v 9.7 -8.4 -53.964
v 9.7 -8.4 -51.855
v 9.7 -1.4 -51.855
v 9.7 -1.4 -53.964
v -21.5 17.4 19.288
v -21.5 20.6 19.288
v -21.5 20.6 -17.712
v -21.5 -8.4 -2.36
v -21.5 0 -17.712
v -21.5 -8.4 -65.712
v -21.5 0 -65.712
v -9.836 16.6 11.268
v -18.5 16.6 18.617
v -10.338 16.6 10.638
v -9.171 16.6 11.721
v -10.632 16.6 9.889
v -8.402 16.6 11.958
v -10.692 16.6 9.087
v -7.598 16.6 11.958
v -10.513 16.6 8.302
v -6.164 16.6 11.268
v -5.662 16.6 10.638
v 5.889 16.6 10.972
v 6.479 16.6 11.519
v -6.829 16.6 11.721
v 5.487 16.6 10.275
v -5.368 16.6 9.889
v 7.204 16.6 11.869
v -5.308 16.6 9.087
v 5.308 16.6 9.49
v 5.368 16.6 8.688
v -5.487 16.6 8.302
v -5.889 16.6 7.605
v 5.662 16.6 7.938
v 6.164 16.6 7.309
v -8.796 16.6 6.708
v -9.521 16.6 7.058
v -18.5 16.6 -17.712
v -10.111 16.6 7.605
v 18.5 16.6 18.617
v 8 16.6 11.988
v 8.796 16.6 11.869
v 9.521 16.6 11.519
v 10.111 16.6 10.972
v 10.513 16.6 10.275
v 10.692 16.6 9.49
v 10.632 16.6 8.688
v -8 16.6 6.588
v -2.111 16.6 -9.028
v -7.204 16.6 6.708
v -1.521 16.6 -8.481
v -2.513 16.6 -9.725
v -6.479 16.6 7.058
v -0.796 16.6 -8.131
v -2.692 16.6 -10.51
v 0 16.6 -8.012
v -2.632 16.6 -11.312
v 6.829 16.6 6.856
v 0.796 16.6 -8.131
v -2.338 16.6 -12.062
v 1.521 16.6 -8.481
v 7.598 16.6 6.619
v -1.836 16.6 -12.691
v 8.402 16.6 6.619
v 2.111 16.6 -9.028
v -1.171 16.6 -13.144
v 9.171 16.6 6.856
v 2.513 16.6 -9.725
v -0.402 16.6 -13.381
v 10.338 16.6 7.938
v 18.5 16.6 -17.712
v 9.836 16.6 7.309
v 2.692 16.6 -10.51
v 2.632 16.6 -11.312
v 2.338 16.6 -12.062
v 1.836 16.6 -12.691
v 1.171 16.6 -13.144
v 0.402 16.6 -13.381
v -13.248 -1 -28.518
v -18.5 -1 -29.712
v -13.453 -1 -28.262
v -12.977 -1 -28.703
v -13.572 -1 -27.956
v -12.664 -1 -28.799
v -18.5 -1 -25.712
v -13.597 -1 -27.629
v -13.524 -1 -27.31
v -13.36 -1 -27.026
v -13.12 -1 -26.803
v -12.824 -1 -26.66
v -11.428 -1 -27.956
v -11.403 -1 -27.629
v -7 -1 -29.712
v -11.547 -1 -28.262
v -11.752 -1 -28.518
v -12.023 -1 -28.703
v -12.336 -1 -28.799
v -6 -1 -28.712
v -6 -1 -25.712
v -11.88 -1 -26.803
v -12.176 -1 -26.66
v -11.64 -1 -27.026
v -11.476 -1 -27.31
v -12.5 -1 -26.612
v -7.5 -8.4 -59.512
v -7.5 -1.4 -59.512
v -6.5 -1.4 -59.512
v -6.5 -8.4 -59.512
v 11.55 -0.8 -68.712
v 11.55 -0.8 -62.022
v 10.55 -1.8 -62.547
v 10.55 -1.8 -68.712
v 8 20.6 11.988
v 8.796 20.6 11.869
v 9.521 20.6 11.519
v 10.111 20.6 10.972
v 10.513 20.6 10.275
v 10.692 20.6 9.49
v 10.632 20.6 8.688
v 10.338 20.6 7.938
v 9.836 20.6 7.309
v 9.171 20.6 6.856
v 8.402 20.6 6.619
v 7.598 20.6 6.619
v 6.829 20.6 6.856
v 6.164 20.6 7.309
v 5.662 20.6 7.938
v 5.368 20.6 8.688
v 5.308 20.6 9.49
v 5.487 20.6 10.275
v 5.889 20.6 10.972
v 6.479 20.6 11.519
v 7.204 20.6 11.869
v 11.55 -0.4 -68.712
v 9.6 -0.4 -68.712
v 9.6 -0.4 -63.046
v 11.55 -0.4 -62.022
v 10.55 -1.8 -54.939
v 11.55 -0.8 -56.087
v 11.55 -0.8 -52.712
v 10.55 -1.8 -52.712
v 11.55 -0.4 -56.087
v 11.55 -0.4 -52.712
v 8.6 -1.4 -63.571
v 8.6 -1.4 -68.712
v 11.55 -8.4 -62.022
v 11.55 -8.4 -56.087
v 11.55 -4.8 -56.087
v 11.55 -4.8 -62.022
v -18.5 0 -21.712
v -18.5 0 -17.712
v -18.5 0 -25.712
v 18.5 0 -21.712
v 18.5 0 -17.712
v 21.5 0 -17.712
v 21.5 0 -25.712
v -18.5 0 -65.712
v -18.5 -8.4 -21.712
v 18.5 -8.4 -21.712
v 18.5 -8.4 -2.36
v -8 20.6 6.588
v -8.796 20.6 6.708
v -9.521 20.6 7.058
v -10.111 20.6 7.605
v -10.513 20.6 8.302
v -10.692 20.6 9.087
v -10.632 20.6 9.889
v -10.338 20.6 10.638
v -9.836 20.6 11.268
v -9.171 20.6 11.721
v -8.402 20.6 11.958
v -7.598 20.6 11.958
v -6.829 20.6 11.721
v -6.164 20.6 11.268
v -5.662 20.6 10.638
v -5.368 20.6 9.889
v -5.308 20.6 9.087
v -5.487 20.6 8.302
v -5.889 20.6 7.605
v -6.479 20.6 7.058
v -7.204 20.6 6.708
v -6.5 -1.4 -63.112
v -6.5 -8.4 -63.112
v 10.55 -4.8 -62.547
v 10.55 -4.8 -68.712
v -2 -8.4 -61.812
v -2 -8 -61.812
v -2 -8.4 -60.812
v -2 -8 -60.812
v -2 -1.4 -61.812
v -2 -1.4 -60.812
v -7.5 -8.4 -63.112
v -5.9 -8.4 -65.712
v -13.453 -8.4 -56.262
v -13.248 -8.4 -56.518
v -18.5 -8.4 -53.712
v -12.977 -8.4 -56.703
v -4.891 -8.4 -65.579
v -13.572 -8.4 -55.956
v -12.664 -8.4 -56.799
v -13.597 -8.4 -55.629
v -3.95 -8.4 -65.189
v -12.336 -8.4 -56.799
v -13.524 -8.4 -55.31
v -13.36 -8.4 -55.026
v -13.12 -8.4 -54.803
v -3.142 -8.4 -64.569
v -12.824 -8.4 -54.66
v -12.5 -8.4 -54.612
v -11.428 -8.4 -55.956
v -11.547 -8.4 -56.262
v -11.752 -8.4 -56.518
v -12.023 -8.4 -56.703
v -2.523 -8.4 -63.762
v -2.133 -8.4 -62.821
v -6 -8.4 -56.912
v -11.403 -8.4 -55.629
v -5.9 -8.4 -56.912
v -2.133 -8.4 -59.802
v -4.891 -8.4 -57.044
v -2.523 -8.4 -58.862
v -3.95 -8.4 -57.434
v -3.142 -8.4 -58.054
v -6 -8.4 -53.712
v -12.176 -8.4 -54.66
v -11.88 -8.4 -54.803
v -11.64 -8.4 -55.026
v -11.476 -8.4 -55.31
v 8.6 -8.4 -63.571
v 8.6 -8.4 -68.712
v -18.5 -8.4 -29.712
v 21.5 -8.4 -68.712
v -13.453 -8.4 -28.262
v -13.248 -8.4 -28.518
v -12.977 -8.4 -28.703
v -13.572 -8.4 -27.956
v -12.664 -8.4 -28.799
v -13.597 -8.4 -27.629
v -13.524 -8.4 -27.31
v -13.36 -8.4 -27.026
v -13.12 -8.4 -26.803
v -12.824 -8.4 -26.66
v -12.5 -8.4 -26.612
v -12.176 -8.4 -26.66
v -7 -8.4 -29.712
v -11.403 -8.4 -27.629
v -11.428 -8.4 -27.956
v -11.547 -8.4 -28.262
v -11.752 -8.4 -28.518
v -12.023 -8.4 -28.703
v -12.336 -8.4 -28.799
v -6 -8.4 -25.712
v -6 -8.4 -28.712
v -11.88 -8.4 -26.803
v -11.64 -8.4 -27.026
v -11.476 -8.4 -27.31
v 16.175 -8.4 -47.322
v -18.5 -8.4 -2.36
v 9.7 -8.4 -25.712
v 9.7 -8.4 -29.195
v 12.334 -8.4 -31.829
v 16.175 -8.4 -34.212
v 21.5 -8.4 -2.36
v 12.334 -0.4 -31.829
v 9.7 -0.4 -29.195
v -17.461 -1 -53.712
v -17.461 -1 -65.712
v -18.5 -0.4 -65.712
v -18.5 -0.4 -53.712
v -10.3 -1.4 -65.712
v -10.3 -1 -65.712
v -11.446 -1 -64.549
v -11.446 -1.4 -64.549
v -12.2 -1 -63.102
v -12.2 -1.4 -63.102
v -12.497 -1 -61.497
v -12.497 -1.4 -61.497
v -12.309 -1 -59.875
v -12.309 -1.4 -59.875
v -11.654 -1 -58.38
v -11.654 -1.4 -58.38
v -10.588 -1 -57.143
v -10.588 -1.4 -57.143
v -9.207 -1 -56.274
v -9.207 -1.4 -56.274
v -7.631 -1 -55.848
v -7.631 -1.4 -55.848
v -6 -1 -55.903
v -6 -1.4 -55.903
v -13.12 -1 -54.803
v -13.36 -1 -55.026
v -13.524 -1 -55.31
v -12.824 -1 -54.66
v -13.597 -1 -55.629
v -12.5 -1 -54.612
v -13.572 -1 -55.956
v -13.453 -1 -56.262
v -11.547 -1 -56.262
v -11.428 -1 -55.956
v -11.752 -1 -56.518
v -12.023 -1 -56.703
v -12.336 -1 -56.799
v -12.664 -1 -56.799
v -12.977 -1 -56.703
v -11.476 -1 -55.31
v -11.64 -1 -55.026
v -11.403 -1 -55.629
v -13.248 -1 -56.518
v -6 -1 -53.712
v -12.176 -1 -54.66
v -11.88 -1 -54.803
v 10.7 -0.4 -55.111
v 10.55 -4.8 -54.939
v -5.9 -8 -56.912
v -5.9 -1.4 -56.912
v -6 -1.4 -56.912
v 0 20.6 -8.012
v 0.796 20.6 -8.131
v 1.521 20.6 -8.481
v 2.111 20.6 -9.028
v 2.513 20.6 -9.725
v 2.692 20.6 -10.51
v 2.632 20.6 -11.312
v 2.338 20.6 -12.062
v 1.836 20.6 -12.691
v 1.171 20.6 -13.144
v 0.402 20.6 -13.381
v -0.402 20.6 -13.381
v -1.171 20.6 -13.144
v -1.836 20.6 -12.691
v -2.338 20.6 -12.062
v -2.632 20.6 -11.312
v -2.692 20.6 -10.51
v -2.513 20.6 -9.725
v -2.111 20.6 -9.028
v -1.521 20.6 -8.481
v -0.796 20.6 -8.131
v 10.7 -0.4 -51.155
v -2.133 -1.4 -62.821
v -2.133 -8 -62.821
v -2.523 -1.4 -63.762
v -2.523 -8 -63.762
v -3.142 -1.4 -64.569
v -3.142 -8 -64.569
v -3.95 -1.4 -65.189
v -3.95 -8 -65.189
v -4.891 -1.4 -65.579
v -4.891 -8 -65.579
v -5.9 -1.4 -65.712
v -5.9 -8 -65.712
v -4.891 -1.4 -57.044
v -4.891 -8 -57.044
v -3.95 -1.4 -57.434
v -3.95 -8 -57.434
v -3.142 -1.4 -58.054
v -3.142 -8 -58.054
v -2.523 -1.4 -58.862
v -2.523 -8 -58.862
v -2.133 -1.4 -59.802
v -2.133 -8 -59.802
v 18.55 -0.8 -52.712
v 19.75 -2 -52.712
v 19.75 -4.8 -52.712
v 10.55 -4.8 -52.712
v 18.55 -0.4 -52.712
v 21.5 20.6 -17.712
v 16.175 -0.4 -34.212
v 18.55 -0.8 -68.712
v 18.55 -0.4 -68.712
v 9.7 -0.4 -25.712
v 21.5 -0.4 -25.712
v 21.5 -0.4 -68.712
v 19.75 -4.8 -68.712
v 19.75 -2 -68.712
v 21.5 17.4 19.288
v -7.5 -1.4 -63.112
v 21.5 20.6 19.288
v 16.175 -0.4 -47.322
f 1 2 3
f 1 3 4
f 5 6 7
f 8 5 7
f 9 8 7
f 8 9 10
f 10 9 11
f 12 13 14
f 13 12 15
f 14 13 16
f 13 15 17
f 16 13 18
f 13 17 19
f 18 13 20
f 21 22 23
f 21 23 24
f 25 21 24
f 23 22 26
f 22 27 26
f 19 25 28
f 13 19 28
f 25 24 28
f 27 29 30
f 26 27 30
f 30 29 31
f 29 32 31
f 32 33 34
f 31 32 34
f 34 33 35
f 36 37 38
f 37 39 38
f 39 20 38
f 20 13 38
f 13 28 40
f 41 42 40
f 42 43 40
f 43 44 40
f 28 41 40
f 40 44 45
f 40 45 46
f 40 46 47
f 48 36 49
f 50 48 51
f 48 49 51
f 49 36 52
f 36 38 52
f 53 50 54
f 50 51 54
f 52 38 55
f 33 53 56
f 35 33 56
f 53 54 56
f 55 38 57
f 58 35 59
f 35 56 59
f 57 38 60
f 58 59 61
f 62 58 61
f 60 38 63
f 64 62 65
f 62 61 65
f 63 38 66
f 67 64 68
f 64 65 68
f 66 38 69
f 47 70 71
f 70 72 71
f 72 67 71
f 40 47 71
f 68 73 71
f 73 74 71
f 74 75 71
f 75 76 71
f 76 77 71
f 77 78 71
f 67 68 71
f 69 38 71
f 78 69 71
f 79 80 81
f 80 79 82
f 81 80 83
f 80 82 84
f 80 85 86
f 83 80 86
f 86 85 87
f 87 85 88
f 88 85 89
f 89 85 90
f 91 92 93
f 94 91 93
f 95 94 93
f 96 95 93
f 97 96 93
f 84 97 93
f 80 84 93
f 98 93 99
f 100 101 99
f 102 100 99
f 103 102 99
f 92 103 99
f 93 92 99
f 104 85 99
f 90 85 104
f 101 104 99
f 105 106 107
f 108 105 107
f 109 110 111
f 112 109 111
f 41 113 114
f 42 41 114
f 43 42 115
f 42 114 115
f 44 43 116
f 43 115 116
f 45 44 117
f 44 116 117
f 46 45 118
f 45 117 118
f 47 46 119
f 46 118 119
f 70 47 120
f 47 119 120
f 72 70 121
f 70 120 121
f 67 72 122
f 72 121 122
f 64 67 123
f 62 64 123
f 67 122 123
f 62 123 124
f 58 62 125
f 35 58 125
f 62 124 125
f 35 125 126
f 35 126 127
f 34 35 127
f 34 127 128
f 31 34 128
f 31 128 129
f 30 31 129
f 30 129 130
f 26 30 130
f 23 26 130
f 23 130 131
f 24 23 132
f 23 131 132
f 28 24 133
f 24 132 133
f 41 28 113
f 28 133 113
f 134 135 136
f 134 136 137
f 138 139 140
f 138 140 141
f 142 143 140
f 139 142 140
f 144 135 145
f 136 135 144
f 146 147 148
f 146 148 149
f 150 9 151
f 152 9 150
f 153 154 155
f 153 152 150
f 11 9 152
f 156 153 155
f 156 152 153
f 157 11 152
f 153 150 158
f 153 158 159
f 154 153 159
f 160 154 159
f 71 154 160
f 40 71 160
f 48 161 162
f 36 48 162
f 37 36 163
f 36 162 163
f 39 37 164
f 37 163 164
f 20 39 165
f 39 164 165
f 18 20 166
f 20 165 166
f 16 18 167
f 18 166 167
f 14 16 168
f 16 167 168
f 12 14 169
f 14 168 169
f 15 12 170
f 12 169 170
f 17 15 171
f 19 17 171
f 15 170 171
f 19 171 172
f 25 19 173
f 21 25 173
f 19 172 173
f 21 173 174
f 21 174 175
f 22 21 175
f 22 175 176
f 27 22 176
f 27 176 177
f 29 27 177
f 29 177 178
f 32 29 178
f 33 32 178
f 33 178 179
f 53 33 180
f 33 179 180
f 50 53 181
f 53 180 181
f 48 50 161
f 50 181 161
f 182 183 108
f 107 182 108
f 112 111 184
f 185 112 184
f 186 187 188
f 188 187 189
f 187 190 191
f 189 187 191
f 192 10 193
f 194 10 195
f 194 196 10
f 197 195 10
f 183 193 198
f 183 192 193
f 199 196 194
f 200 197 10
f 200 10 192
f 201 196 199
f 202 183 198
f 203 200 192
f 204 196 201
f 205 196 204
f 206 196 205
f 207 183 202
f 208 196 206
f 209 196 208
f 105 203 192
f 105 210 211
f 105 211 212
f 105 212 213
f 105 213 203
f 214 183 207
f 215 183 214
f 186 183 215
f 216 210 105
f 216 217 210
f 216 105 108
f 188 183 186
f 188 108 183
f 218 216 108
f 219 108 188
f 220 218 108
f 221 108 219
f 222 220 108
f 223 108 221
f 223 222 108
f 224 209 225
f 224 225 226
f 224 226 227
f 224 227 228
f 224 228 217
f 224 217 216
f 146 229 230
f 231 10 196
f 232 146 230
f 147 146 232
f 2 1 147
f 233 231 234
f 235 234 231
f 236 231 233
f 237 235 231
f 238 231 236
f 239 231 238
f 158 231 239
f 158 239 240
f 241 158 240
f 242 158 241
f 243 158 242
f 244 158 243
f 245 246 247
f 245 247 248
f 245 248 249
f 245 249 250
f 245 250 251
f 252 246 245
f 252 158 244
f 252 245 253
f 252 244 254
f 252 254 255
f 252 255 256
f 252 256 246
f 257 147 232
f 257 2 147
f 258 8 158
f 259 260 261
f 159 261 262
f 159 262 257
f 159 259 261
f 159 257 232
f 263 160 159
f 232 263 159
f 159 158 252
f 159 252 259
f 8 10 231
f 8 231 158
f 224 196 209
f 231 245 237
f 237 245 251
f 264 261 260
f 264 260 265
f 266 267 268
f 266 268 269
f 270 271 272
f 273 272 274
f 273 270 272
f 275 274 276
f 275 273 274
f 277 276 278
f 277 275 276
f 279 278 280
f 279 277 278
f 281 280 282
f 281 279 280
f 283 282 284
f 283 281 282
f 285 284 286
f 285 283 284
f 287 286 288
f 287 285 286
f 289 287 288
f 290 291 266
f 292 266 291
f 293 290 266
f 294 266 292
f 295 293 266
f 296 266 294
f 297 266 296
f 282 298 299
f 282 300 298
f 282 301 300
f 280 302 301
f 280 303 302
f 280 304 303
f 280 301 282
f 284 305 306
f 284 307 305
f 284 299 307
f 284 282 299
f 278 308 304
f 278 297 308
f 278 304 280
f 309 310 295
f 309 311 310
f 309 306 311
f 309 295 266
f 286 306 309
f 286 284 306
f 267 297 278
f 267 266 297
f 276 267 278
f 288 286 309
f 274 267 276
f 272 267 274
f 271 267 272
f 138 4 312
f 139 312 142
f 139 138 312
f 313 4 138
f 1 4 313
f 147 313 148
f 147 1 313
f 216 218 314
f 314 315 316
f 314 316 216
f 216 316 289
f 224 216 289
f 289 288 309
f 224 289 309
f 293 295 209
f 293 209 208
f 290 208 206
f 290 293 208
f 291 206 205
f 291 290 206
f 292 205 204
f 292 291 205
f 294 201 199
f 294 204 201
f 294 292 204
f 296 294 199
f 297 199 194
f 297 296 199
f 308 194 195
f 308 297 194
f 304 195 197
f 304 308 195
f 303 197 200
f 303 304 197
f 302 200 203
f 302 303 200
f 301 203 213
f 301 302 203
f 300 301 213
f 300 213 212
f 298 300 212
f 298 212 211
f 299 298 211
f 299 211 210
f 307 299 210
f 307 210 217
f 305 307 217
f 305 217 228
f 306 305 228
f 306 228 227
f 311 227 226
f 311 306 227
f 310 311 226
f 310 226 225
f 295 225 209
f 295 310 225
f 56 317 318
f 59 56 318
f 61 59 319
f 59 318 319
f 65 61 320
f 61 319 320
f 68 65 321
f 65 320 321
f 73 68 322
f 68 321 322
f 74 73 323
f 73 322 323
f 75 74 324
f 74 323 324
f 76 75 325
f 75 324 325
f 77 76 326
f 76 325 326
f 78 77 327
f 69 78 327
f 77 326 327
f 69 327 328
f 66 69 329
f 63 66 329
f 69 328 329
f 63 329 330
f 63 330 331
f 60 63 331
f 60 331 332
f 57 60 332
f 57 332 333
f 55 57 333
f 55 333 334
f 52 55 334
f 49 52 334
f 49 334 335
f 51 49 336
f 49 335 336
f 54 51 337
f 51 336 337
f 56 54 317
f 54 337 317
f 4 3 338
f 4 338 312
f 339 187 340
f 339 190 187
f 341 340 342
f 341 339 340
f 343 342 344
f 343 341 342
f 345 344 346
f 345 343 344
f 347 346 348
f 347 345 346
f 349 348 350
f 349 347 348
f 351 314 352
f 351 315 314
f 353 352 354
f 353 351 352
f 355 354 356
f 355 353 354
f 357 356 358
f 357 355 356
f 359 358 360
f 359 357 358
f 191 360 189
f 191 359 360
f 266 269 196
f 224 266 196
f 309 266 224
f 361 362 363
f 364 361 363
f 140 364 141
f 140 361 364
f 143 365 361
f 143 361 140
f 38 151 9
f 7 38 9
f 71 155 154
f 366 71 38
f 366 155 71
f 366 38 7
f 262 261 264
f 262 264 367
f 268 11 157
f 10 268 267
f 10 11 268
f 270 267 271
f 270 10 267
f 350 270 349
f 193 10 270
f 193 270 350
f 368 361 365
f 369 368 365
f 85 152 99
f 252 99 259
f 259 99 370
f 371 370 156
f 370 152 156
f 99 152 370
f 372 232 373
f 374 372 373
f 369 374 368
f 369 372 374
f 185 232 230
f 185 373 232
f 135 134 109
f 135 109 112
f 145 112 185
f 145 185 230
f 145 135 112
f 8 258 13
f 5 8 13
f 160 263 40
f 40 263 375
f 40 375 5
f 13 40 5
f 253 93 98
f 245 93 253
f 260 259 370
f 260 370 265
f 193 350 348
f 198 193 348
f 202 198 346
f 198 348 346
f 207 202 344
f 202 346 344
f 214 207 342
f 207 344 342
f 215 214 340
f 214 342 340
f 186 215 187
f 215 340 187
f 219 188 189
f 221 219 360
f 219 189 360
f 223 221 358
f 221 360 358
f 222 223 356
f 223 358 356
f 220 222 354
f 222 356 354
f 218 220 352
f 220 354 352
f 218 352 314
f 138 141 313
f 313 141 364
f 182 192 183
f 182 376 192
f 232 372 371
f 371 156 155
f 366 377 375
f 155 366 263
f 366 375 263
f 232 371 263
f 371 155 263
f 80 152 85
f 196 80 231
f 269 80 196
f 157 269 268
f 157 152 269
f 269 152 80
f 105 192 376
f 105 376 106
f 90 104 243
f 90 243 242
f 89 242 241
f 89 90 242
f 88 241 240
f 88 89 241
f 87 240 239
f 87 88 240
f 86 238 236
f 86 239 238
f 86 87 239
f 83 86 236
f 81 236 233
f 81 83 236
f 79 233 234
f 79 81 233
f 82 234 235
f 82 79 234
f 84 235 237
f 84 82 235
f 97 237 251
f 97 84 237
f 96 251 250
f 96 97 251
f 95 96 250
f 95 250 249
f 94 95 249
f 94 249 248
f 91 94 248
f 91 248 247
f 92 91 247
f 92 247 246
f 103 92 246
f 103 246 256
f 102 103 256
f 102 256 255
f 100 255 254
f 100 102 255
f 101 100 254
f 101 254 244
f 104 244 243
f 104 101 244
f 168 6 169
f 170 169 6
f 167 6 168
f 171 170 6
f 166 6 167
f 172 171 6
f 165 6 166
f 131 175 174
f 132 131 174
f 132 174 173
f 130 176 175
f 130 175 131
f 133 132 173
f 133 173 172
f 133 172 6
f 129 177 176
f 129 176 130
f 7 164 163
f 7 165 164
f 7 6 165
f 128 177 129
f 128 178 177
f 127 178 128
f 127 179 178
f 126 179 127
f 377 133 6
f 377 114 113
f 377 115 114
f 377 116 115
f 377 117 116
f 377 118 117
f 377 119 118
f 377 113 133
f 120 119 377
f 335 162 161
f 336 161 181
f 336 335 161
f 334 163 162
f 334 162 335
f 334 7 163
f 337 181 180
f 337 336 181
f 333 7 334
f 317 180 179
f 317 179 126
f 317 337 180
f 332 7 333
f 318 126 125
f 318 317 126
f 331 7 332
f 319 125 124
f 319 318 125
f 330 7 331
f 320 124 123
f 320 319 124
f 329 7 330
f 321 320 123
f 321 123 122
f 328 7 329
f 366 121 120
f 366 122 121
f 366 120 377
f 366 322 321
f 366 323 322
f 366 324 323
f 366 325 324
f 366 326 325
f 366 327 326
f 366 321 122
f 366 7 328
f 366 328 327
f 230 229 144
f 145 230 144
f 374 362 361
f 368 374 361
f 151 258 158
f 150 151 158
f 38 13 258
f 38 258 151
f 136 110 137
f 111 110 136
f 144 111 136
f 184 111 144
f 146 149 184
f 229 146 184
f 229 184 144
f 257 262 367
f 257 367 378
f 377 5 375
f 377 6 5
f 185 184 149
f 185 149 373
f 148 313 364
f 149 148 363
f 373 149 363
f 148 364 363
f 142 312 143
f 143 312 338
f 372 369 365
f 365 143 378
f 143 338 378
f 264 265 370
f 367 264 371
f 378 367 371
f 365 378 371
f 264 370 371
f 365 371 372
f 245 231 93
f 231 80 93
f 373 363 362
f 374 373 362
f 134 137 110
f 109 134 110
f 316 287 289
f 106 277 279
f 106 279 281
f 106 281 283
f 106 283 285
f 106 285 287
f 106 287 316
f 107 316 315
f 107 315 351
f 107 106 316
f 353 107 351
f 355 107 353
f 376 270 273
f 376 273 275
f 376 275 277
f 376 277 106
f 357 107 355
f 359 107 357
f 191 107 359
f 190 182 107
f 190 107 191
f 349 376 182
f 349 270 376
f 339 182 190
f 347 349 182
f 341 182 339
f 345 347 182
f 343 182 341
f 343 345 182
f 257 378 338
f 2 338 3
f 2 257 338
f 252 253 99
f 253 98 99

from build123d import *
from OCP.BRepFilletAPI import BRepFilletAPI_MakeChamfer

# Parameters (mm, degrees)
SKETCH1_W                       = 3
SKETCH1_H                       = 37
SKETCH1_H_2                     = 48
BOSS_EXTRUDE1_DEPTH             = 8
SKETCH4_W                       = 19.5
SKETCH4_H                       = 8.8
BOSS_EXTRUDE3_DEPTH             = 6.6
SERVO_HOLDER_DEPTH              = 0.4
SERVO_HOLDER_DEPTH_BACK         = 7
SKETCH3_W                       = 15.5
SKETCH3_H                       = 4
SKETCH3_R                       = 1.04
SKETCH5_W                       = 1
SKETCH5_H                       = 3.6
CUT_EXTRUDE2_DEPTH              = 70.647801738
SKETCH11_W                      = 43
SKETCH11_H                      = 4
BOSS_EXTRUDE9_DEPTH             = 8
BOSS_EXTRUDE9_DIRECTION_2_REACH = 71.601
SKETCH14_W                      = 12.223643904
SKETCH14_H                      = 44.979564252
CUT_EXTRUDE5_DEPTH              = 10
FILLET2_R                       = 3.9
CUT_EXTRUDE4_DEPTH              = 70.647801738
CUT_EXTRUDE4_DEPTH_BACK         = 70.647801738
SKETCH13_R                      = 1.1
SKETCH17_W                      = 12.9
SKETCH17_H                      = 8
BOSS_EXTRUDE11_DEPTH            = 27
BOSS_EXTRUDE12_DEPTH            = 16
SKETCH18_W                      = 1
SKETCH18_H                      = 3.6
SKETCH18_W_2                    = 3
SKETCH18_H_2                    = 24
SKETCH18_H_3                    = 41
BOSS_EXTRUDE13_DEPTH            = 0.4
CHAMFER14_SIZE                  = 1.2
CUT_EXTRUDE6_DEPTH              = 73.439806169
CUT_EXTRUDE6_DEPTH_BACK         = 73.439806169
SKETCH22_W                      = 43
SKETCH22_H                      = 37
SKETCH22_R                      = 2.7
MOUNT_TOP_DEPTH                 = 4
SKETCH23_W                      = 37
SKETCH23_H                      = 29
MOUNT_SIDE1_DEPTH               = 3
SKETCH24_W                      = 37
SKETCH24_H                      = 29
MOUNT_SIDE2_DEPTH               = 3
CHAMFER20_SIZE                  = 21.648770484
CHAMFER20_SIZE_2                = 25.8
SKETCH29_W                      = 8.885937164
SKETCH29_H                      = 8
BOSS_EXTRUDE20_DEPTH            = 0.4
CHAMFER23_SIZE                  = 1
CHAMFER24_SIZE                  = 1
CHAMFER24_SIZE2                 = 3.099667104
SKETCH26_R                      = 5.5
CUT_EXTRUDE8_DEPTH              = 10
CHAMFER25_SIZE                  = 0.6
CHAMFER25_SIZE2                 = 1.039230485


with BuildPart() as part:
    # Sketch1 → Boss-Extrude1 (new body)
    with BuildSketch(Plane(origin=(0, 0, 0), x_dir=(1, 0, 0), z_dir=(0, 1, 0))):
        with Locations((-20, -0.788461538)):
            Rectangle(SKETCH1_W, SKETCH1_H)
        with Locations((-20, 41.711538462)):
            Rectangle(SKETCH1_W, SKETCH1_H_2)
        with Locations((20, -0.788461538)):
            Rectangle(SKETCH1_W, SKETCH1_H)
        with Locations((20, 41.711538462)):
            Rectangle(SKETCH1_W, SKETCH1_H_2)
    extrude(amount=-BOSS_EXTRUDE1_DEPTH)

    # Sketch4 → Boss-Extrude3 (add)
    with BuildSketch(Plane.XZ.offset(8)):
        with Locations((-11.75, -61.311538462)):
            Rectangle(SKETCH4_W, SKETCH4_H)
    extrude(amount=-BOSS_EXTRUDE3_DEPTH)

    # Sketch3 → Servo Holder (add, two sides: drawn at the far end of the back side and taken through both)
    # profile 1 of 2: a face of its own
    with BuildSketch(Plane.XZ.offset(8).offset(-SERVO_HOLDER_DEPTH_BACK)):
        with Locations((-13.75, -55.711538462)):
            Rectangle(SKETCH3_W, SKETCH3_H)
        with Locations(Location((-12.5, -55.711538462, 0), (0, 0, 270))):
            Circle(SKETCH3_R, mode=Mode.SUBTRACT)
    # profile 2 of 2: a face of its own
    with BuildSketch(Plane.XZ.offset(8).offset(-SERVO_HOLDER_DEPTH_BACK)):
        with Locations((-13.75, -27.711538462)):
            Rectangle(SKETCH3_W, SKETCH3_H)
        with Locations(Location((-12.5, -27.711538462, 0), (0, 0, 90))):
            Circle(SKETCH3_R, mode=Mode.SUBTRACT)
    extrude(amount=SERVO_HOLDER_DEPTH + SERVO_HOLDER_DEPTH_BACK)

    # Sketch5 → Cut-Extrude2 (cut, through all)
    with BuildSketch(Plane(origin=(0, 0, 0), x_dir=(1, 0, 0), z_dir=(0, 1, 0))):
        with Locations((-7, 61.311538462)):
            Rectangle(SKETCH5_W, SKETCH5_H)
    extrude(amount=-CUT_EXTRUDE2_DEPTH, mode=Mode.SUBTRACT)

    # Sketch11 → Boss-Extrude9 (add)
    with BuildSketch(Plane.XZ.offset(8)):
        with Locations((0, -23.711538462)):
            Rectangle(SKETCH11_W, SKETCH11_H)
    extrude(amount=-BOSS_EXTRUDE9_DEPTH)

    # Boss-Extrude9 direction 2: up to this face of the body (flat: up to its plane)
    boss_extrude9_direction_2_end = Plane(part.part.faces().sort_by_distance((-13.822479257, -8.4, -55.711538462))[0])
    # Sketch11 → Boss-Extrude9 direction 2 (add, up to the picked face)
    with BuildSketch(Plane.XZ.offset(8), mode=Mode.PRIVATE) as boss_extrude9_direction_2_sk1:
        with Locations((0, -23.711538462)):
            Rectangle(SKETCH11_W, SKETCH11_H)
    boss_extrude9_direction_2_tool1 = split(extrude(boss_extrude9_direction_2_sk1.sketch, amount=BOSS_EXTRUDE9_DIRECTION_2_REACH, mode=Mode.PRIVATE), bisect_by=boss_extrude9_direction_2_end, keep=Keep.BOTH, mode=Mode.PRIVATE)
    add(boss_extrude9_direction_2_tool1.solids().sort_by(Axis((0, -8, -23.711538), (0, -1, 0)))[0])

    # Sketch14 → Cut-Extrude5 (cut)
    with BuildSketch(Plane.XZ.offset(8)):
        with Locations((24.611821952, -48.201320588)):
            Rectangle(SKETCH14_W, SKETCH14_H)
    extrude(amount=-CUT_EXTRUDE5_DEPTH, mode=Mode.SUBTRACT)

    # Fillet2
    fillet2_edges = [part.edges().sort_by_distance(p)[0] for p in [
        (-2, -4.7, -65.711538462),
        (-2, -4.7, -56.911538462),
    ]]
    fillet(fillet2_edges, radius=FILLET2_R)

    # Sketch13 → Cut-Extrude4 (cut, two sides: drawn at the far end of the back side and taken through both)
    with BuildSketch(Plane(origin=(0, -8.4, 0), x_dir=(-1, 0, 0), z_dir=(0, -1, 0)).offset(-CUT_EXTRUDE4_DEPTH_BACK)):
        with Locations(Location((12.5, 55.711538462, 0), (0, 0, 270))):
            Circle(SKETCH13_R)
        with Locations(Location((12.5, 27.711538462, 0), (0, 0, 270))):
            Circle(SKETCH13_R)
    extrude(amount=CUT_EXTRUDE4_DEPTH + CUT_EXTRUDE4_DEPTH_BACK, mode=Mode.SUBTRACT)

    # Sketch17 → Boss-Extrude11 (add)
    with BuildSketch(Plane(origin=(0, 0, -25.711538462), x_dir=(-1, 0, 0), z_dir=(0, 0, -1))):
        with Locations((-15.05, -4.4)):
            Rectangle(SKETCH17_W, SKETCH17_H)
    extrude(amount=BOSS_EXTRUDE11_DEPTH)

    # Sketch16 → Boss-Extrude12 (add)
    with BuildSketch(Plane(origin=(0, 0, -52.711538462), x_dir=(-1, 0, 0), z_dir=(0, 0, -1))):
        Polygon((-19.75, -2), (-18.55, -2), (-18.55, -0.4), (-21.5, -0.4), (-21.5, -8.4), (-8.6, -8.4), (-8.6, -0.4), (-11.55, -0.4), (-11.55, -2), (-10.55, -2), (-10.55, -4.8), (-19.75, -4.8), align=None)
    extrude(amount=BOSS_EXTRUDE12_DEPTH)

    # Sketch18 → Boss-Extrude13 (add)
    # profile 1 of 4: a face of its own
    with BuildSketch(Plane.XZ.offset(8)):
        with BuildLine():
            Line((-21.5, -57.711538462), (-21.5, -65.711538462))
            Line((-21.5, -65.711538462), (-5.9, -65.711538462))
            ThreePointArc((-5.9, -65.711538462), (-3.142283553, -64.569254908), (-2, -61.811538462))
            Line((-2, -61.811538462), (-2, -60.811538462))
            ThreePointArc((-2, -60.811538462), (-3.142283553, -58.053822015), (-5.9, -56.911538462))
            Line((-5.9, -56.911538462), (-6, -56.911538462))
            Line((-6, -56.911538462), (-6, -57.711538462))
            Line((-6, -57.711538462), (-21.5, -57.711538462))
        make_face()
        with Locations((-7, -61.311538462)):
            Rectangle(SKETCH18_W, SKETCH18_H, mode=Mode.SUBTRACT)
    # profile 2 of 4: a face of its own
    with BuildSketch(Plane.XZ.offset(8)):
        with Locations((-20, -41.711538462)):
            Rectangle(SKETCH18_W_2, SKETCH18_H_2)
    # profile 3 of 4: a face of its own
    with BuildSketch(Plane.XZ.offset(8)):
        with Locations((-20, -1.211538462)):
            Rectangle(SKETCH18_W_2, SKETCH18_H_3)
    # profile 4 of 4: a face of its own
    with BuildSketch(Plane.XZ.offset(8)):
        with Locations((20, -1.211538462)):
            Rectangle(SKETCH18_W_2, SKETCH18_H_3)
    extrude(amount=BOSS_EXTRUDE13_DEPTH)

    # Chamfer14
    # the kernel refuses this chamfer: 1.2 mm, written as the material it takes off along each edge
    with BuildSketch(Plane(origin=(18.55, -2, -52.711538462), x_dir=(0.9996219169112968, -0.027495876610586622, 0), z_dir=(0, 0, -1))) as chamfer14_piece_1_section:
        Polygon((CHAMFER14_SIZE * 0.999621916911, -CHAMFER14_SIZE * 0.0274958766106), (-CHAMFER14_SIZE * 0.0274958766106, -CHAMFER14_SIZE * 0.999621916911), (0, 0), align=None)
    chamfer14_piece_1 = extrude(amount=19.086019586, mode=Mode.PRIVATE)
    chamfer14_piece_1 = split(chamfer14_piece_1, bisect_by=Plane(origin=(19.75, -1.603515015, -62.254548254), z_dir=(-1, 0, 0)), keep=Keep.TOP, mode=Mode.PRIVATE)
    add(chamfer14_piece_1, mode=Mode.SUBTRACT)
    with BuildSketch(Plane(origin=(11.55, -2, -52.711538462), x_dir=(0.027495876610585914, 0.9996219169112968, 0), z_dir=(0, 0, -1))) as chamfer14_piece_2_section:
        Polygon((CHAMFER14_SIZE * 0.999621916911, -CHAMFER14_SIZE * 0.0274958766106), (-CHAMFER14_SIZE * 0.0274958766106, -CHAMFER14_SIZE * 0.999621916911), (0, 0), align=None)
    chamfer14_piece_2 = extrude(amount=19.086019586, mode=Mode.PRIVATE)
    chamfer14_piece_2 = split(chamfer14_piece_2, bisect_by=Plane(origin=(10.55, -1.589568171, -62.254548254), z_dir=(1, 0, 0)), keep=Keep.TOP, mode=Mode.PRIVATE)
    add(chamfer14_piece_2, mode=Mode.SUBTRACT)

    # Sketch20 → Cut-Extrude6 (cut, two sides: drawn at the far end of the back side and taken through both)
    with BuildSketch(Plane(origin=(0, -0.4, 0), x_dir=(1, 0, 0), z_dir=(0, 1, 0)).offset(-CUT_EXTRUDE6_DEPTH_BACK)):
        Polygon((8.6, 53.963605621), (8.6, 63.570761525), (2.515498959, 66.765310983), (1.997773223, 58.659131413), (1.997773223, 53.963605621), (4.974693998, 53.963605621), (4.974693998, 55.162371456), (6.687222193, 53.963605621), align=None)
        Polygon((8.6, 52.700948092), (8.6, 53.963605621), (6.687222193, 53.963605621), (8.558718605, 52.653562397), align=None)
        Polygon((16.174786864, 47.322331969), (9.7, 51.854668021), (9.7, 30.195176122), (16.174786864, 34.211808124), align=None)
        Polygon((4.974693998, 53.963605621), (6.687222193, 53.963605621), (4.974693998, 55.162371456), align=None)
        Polygon((11.55, 56.087166011), (11.55, 62.021921145), (8.6, 63.570761525), (8.6, 53.963605621), (9.7, 53.963605621), align=None)
        Polygon((8.6, 52.624665515), (8.6, 52.700948092), (8.558718605, 52.653562397), align=None)
        Polygon((9.7, 25.711538462), (9.7, 30.195176122), (8.6, 29.512791467), (8.6, 25.711538462), align=None)
        Polygon((9.7, 53.963605621), (8.6, 53.963605621), (8.6, 52.700948092), align=None)
        Polygon((9.7, 51.854668021), (9.7, 53.963605621), (8.6, 52.700948092), (8.6, 52.624665515), align=None)
        Polygon((8.558718605, 52.653562397), (6.687222193, 53.963605621), (4.974693998, 53.963605621), (4.974693998, 48.539566347), align=None)
        Polygon((9.7, 30.195176122), (9.7, 51.854668021), (8.6, 52.624665515), (8.6, 29.512791467), align=None)
        Polygon((8.6, 52.624665515), (8.558718605, 52.653562397), (4.974693998, 48.539566347), (4.974693998, 27.263834025), (8.6, 29.512791467), align=None)
    extrude(amount=CUT_EXTRUDE6_DEPTH + CUT_EXTRUDE6_DEPTH_BACK, mode=Mode.SUBTRACT)



with BuildPart() as body_2:
    # Sketch22 → Mount Top (new body)
    with BuildSketch(Plane(origin=(0, 20.6, 0), x_dir=(1, 0, 0), z_dir=(0, 1, 0))):
        with Locations((0, -0.788461538)):
            Rectangle(SKETCH22_W, SKETCH22_H)
        with Locations(Location((0, 10.711538462, 0), (0, 0, 270))):
            Circle(SKETCH22_R, mode=Mode.SUBTRACT)
        with Locations(Location((8, -9.288461538, 0), (0, 0, 270))):
            Circle(SKETCH22_R, mode=Mode.SUBTRACT)
        with Locations(Location((-8, -9.288461538, 0), (0, 0, 90))):
            Circle(SKETCH22_R, mode=Mode.SUBTRACT)
    extrude(amount=-MOUNT_TOP_DEPTH)


with BuildPart() as part_1:
    add(part.part)

    add(body_2.part)  # Mount Side1 merges body 2
    # Sketch23 → Mount Side1 (add)
    with BuildSketch(Plane.ZY.offset(21.5)):
        with Locations((0.788461538, 6.1)):
            Rectangle(SKETCH23_W, SKETCH23_H)
    extrude(amount=-MOUNT_SIDE1_DEPTH)

    # Sketch24 → Mount Side2 (add)
    with BuildSketch(Plane(origin=(21.5, 0, 0), x_dir=(0, 0, -1), z_dir=(1, 0, 0))):
        with Locations((-0.788461538, 6.1)):
            Rectangle(SKETCH24_W, SKETCH24_H)
    extrude(amount=-MOUNT_SIDE2_DEPTH)

    # Chamfer20
    # the kernel refuses this chamfer: 25.8, 21.648770484 mm, written as the material it takes off along each edge
    with BuildSketch(Plane(origin=(87.997077466, -8.4, 19.288461538), x_dir=(0, -0.03540953691366264, -0.9993728857116146), z_dir=(-1, 0, 0)), Plane(origin=(47.997077466, -8.4, 19.288461538), x_dir=(0, -0.03540953691366264, -0.9993728857116146), z_dir=(-1, 0, 0))) as chamfer20_piece_1:
        Polygon((CHAMFER20_SIZE * 0.999372885729, -CHAMFER20_SIZE * 0.0354095369143), (-CHAMFER20_SIZE_2 * 0.0354095369137, -CHAMFER20_SIZE_2 * 0.999372885712), (0, 0), align=None)
    extrude(amount=135.994154933, mode=Mode.SUBTRACT)

    # Sketch29 → Boss-Extrude20 (add)
    with BuildSketch(Plane(origin=(0, -1.4, 0), x_dir=(1, 0, 0), z_dir=(0, 1, 0))):
        with Locations((-14.057031418, 61.711538462)):
            Rectangle(SKETCH29_W, SKETCH29_H)
    extrude(amount=BOSS_EXTRUDE20_DEPTH)

    # Chamfer23
    chamfer23_edges = [part_1.edges().sort_by_distance(p)[0] for p in [
        (9.7, -0.4, -52.909136821),
    ]]
    chamfer(chamfer23_edges, length=CHAMFER23_SIZE)

    # Chamfer24: one chamfer whose edges measure the first distance from different faces: ONE call of the kernel's chamfer builder (chamfer() names one face for all edges)
    chamfer24_edges_1 = [part_1.edges().sort_by_distance(p)[0] for p in [
        (8.6, -0.4, -66.141149993),
        (-6, -4.7, -29.711538462),
    ]]
    chamfer24_edges_2 = [part_1.edges().sort_by_distance(p)[0] for p in [
        (9.7, -4.4, -30.195176122),
    ]]
    chamfer24_side_2 = [part_1.faces().sort_by_distance(p)[0] for p in [
        (9.7, -4.4, -27.953357292),
    ]]
    chamfer24 = BRepFilletAPI_MakeChamfer(part_1.part.solid().wrapped)
    for e in chamfer24_edges_1:
        chamfer24.Add(CHAMFER24_SIZE, e.wrapped)
    for e in chamfer24_edges_2:
        chamfer24.Add(CHAMFER24_SIZE, CHAMFER24_SIZE2, e.wrapped, chamfer24_side_2[0].wrapped)  # the first distance lies on this face
    add(Compound.cast(chamfer24.Shape()), mode=Mode.REPLACE)

    # Sketch26 → Cut-Extrude8 (cut)
    with BuildSketch(Plane(origin=(0, -1.4, 0), x_dir=(1, 0, 0), z_dir=(0, 1, 0))):
        with Locations((-7, 61.311538462)):
            Circle(SKETCH26_R)
    extrude(amount=CUT_EXTRUDE8_DEPTH, mode=Mode.SUBTRACT)

    # Chamfer25
    chamfer25_edges = [part_1.edges().sort_by_distance(p)[0] for p in [
        (-18.5, -1, -59.711538462),
    ]]
    chamfer25_side = [part_1.faces().sort_by_distance(p)[0] for p in [
        (-18.5, -3.927941176, -42.446832579),
    ]]
    chamfer(chamfer25_edges, length=CHAMFER25_SIZE, length2=CHAMFER25_SIZE2, reference=chamfer25_side[0])


solid = part_1.part
